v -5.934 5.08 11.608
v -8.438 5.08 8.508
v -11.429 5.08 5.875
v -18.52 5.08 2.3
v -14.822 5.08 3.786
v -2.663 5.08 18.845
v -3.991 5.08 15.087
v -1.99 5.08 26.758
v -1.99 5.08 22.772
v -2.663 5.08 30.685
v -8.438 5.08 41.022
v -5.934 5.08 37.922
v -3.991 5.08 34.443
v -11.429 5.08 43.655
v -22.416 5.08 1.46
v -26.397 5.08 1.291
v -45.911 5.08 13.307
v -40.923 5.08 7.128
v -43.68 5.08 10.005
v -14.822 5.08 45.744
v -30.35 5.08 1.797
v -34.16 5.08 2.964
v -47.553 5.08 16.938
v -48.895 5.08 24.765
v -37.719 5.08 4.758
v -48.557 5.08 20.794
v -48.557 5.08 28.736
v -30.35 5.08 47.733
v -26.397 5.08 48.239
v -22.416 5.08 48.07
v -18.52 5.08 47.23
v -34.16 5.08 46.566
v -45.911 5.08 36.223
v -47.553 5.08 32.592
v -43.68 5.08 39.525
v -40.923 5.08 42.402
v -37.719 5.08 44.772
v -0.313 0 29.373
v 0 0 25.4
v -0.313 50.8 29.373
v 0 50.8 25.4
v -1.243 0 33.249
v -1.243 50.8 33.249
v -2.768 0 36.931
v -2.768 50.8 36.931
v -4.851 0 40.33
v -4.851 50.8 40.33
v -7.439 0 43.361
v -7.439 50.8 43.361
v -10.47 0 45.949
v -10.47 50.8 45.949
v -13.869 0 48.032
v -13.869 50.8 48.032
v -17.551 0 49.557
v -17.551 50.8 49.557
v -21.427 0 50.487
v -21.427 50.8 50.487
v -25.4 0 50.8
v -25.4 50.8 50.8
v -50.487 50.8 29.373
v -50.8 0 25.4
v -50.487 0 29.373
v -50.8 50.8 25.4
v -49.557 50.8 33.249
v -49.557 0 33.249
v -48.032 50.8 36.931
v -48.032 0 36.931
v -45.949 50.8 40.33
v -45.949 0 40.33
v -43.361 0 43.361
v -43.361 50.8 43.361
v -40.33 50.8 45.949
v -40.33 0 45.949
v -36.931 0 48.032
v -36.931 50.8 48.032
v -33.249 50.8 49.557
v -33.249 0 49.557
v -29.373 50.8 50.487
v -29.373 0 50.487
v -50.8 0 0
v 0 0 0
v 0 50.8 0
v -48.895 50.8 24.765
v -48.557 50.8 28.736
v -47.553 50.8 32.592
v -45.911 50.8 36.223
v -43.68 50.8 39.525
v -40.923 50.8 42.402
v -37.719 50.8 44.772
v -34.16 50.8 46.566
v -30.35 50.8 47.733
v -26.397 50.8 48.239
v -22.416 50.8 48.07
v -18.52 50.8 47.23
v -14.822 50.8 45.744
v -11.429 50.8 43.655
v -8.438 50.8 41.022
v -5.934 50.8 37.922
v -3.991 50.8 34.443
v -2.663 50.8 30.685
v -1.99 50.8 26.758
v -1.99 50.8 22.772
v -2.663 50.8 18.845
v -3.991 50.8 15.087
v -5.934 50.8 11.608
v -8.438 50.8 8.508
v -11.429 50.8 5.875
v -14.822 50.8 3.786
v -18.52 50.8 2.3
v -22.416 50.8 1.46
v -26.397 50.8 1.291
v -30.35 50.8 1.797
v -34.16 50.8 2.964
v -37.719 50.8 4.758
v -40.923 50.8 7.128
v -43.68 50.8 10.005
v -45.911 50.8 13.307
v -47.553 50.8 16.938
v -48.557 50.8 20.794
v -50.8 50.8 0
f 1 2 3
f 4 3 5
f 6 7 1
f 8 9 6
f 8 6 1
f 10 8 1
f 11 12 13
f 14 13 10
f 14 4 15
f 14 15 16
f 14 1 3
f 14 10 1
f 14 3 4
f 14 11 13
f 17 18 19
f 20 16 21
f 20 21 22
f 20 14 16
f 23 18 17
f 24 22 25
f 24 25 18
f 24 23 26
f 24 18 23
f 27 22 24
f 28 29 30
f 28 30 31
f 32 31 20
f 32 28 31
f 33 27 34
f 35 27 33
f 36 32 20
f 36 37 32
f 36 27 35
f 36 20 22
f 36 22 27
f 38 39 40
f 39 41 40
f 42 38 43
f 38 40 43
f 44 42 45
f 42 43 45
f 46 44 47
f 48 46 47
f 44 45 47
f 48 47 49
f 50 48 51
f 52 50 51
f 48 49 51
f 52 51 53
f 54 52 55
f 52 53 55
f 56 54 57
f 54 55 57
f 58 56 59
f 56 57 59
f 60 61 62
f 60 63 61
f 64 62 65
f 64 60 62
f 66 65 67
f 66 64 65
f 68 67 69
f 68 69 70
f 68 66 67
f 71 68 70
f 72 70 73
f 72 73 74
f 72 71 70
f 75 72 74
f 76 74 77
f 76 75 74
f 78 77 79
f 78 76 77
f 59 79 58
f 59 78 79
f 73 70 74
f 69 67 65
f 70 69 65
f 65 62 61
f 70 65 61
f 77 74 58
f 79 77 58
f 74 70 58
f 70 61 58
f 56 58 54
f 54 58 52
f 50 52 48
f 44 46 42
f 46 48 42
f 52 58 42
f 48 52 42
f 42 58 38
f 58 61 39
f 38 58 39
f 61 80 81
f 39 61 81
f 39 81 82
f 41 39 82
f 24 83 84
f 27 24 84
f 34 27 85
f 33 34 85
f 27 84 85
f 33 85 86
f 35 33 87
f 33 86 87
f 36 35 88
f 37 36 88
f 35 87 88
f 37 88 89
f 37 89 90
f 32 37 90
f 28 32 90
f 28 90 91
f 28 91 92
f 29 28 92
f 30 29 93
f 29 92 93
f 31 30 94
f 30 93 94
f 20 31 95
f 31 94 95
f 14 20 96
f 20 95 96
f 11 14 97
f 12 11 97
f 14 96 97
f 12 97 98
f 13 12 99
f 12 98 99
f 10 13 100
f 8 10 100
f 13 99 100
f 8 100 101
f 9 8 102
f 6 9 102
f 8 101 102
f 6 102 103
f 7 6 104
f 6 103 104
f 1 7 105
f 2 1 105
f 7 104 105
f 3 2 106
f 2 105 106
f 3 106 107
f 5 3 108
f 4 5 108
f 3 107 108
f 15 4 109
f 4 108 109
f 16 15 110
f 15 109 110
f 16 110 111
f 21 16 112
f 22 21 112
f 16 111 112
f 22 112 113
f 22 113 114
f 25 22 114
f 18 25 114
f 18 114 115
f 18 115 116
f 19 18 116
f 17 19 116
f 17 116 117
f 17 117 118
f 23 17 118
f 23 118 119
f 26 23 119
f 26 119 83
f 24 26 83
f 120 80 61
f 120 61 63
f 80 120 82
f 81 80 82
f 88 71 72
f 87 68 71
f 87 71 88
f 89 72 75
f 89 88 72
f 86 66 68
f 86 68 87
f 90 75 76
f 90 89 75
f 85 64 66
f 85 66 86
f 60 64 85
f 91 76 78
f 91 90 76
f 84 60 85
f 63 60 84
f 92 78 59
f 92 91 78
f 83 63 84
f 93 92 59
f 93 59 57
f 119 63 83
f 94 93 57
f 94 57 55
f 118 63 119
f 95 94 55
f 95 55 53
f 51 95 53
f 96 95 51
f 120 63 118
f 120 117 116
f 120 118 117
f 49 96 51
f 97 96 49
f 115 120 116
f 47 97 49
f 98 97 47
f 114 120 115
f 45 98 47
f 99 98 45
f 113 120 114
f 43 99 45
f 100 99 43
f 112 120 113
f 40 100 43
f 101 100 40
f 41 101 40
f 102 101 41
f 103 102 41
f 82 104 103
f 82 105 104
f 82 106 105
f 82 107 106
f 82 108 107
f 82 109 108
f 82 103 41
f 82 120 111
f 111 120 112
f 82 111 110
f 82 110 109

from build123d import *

# Parameters (mm, degrees)
F0_W     = 50.8
F0_H     = 50.8
F1_DEPTH = 50.8
F3_R     = 25.39999
F2_R     = 23.495
F4_DEPTH = 45.72


# Not quite as in the source:
# - a fillet or chamfer is up to 0.001 mm smaller than in the source, because OpenCascade refuses the exact size


with BuildPart() as f1:
    # F0 (on Top) → F1 (new body)
    with BuildSketch(Plane.XY):
        with Locations((-25.4, 25.4)):
            Rectangle(F0_W, F0_H)
    extrude(amount=F1_DEPTH)

    # F3 (radius 25.4 in the source; OpenCascade refuses exactly that, so slightly less here)
    f3_edges = [f1.edges().sort_by_distance(p)[0] for p in [
        (0, 25.4, 50.8),
        (-50.8, 25.4, 50.8),
    ]]
    fillet(f3_edges, radius=F3_R)

    # F2 (on face) → F4 (cut)
    with BuildSketch(Plane(origin=(0, 50.8, 0), x_dir=(-1, 0, 0), z_dir=(0, 1, 0))):
        with Locations((25.4, 24.765)):
            Circle(F2_R)
    extrude(amount=-F4_DEPTH, mode=Mode.SUBTRACT)


solid = f1.part
